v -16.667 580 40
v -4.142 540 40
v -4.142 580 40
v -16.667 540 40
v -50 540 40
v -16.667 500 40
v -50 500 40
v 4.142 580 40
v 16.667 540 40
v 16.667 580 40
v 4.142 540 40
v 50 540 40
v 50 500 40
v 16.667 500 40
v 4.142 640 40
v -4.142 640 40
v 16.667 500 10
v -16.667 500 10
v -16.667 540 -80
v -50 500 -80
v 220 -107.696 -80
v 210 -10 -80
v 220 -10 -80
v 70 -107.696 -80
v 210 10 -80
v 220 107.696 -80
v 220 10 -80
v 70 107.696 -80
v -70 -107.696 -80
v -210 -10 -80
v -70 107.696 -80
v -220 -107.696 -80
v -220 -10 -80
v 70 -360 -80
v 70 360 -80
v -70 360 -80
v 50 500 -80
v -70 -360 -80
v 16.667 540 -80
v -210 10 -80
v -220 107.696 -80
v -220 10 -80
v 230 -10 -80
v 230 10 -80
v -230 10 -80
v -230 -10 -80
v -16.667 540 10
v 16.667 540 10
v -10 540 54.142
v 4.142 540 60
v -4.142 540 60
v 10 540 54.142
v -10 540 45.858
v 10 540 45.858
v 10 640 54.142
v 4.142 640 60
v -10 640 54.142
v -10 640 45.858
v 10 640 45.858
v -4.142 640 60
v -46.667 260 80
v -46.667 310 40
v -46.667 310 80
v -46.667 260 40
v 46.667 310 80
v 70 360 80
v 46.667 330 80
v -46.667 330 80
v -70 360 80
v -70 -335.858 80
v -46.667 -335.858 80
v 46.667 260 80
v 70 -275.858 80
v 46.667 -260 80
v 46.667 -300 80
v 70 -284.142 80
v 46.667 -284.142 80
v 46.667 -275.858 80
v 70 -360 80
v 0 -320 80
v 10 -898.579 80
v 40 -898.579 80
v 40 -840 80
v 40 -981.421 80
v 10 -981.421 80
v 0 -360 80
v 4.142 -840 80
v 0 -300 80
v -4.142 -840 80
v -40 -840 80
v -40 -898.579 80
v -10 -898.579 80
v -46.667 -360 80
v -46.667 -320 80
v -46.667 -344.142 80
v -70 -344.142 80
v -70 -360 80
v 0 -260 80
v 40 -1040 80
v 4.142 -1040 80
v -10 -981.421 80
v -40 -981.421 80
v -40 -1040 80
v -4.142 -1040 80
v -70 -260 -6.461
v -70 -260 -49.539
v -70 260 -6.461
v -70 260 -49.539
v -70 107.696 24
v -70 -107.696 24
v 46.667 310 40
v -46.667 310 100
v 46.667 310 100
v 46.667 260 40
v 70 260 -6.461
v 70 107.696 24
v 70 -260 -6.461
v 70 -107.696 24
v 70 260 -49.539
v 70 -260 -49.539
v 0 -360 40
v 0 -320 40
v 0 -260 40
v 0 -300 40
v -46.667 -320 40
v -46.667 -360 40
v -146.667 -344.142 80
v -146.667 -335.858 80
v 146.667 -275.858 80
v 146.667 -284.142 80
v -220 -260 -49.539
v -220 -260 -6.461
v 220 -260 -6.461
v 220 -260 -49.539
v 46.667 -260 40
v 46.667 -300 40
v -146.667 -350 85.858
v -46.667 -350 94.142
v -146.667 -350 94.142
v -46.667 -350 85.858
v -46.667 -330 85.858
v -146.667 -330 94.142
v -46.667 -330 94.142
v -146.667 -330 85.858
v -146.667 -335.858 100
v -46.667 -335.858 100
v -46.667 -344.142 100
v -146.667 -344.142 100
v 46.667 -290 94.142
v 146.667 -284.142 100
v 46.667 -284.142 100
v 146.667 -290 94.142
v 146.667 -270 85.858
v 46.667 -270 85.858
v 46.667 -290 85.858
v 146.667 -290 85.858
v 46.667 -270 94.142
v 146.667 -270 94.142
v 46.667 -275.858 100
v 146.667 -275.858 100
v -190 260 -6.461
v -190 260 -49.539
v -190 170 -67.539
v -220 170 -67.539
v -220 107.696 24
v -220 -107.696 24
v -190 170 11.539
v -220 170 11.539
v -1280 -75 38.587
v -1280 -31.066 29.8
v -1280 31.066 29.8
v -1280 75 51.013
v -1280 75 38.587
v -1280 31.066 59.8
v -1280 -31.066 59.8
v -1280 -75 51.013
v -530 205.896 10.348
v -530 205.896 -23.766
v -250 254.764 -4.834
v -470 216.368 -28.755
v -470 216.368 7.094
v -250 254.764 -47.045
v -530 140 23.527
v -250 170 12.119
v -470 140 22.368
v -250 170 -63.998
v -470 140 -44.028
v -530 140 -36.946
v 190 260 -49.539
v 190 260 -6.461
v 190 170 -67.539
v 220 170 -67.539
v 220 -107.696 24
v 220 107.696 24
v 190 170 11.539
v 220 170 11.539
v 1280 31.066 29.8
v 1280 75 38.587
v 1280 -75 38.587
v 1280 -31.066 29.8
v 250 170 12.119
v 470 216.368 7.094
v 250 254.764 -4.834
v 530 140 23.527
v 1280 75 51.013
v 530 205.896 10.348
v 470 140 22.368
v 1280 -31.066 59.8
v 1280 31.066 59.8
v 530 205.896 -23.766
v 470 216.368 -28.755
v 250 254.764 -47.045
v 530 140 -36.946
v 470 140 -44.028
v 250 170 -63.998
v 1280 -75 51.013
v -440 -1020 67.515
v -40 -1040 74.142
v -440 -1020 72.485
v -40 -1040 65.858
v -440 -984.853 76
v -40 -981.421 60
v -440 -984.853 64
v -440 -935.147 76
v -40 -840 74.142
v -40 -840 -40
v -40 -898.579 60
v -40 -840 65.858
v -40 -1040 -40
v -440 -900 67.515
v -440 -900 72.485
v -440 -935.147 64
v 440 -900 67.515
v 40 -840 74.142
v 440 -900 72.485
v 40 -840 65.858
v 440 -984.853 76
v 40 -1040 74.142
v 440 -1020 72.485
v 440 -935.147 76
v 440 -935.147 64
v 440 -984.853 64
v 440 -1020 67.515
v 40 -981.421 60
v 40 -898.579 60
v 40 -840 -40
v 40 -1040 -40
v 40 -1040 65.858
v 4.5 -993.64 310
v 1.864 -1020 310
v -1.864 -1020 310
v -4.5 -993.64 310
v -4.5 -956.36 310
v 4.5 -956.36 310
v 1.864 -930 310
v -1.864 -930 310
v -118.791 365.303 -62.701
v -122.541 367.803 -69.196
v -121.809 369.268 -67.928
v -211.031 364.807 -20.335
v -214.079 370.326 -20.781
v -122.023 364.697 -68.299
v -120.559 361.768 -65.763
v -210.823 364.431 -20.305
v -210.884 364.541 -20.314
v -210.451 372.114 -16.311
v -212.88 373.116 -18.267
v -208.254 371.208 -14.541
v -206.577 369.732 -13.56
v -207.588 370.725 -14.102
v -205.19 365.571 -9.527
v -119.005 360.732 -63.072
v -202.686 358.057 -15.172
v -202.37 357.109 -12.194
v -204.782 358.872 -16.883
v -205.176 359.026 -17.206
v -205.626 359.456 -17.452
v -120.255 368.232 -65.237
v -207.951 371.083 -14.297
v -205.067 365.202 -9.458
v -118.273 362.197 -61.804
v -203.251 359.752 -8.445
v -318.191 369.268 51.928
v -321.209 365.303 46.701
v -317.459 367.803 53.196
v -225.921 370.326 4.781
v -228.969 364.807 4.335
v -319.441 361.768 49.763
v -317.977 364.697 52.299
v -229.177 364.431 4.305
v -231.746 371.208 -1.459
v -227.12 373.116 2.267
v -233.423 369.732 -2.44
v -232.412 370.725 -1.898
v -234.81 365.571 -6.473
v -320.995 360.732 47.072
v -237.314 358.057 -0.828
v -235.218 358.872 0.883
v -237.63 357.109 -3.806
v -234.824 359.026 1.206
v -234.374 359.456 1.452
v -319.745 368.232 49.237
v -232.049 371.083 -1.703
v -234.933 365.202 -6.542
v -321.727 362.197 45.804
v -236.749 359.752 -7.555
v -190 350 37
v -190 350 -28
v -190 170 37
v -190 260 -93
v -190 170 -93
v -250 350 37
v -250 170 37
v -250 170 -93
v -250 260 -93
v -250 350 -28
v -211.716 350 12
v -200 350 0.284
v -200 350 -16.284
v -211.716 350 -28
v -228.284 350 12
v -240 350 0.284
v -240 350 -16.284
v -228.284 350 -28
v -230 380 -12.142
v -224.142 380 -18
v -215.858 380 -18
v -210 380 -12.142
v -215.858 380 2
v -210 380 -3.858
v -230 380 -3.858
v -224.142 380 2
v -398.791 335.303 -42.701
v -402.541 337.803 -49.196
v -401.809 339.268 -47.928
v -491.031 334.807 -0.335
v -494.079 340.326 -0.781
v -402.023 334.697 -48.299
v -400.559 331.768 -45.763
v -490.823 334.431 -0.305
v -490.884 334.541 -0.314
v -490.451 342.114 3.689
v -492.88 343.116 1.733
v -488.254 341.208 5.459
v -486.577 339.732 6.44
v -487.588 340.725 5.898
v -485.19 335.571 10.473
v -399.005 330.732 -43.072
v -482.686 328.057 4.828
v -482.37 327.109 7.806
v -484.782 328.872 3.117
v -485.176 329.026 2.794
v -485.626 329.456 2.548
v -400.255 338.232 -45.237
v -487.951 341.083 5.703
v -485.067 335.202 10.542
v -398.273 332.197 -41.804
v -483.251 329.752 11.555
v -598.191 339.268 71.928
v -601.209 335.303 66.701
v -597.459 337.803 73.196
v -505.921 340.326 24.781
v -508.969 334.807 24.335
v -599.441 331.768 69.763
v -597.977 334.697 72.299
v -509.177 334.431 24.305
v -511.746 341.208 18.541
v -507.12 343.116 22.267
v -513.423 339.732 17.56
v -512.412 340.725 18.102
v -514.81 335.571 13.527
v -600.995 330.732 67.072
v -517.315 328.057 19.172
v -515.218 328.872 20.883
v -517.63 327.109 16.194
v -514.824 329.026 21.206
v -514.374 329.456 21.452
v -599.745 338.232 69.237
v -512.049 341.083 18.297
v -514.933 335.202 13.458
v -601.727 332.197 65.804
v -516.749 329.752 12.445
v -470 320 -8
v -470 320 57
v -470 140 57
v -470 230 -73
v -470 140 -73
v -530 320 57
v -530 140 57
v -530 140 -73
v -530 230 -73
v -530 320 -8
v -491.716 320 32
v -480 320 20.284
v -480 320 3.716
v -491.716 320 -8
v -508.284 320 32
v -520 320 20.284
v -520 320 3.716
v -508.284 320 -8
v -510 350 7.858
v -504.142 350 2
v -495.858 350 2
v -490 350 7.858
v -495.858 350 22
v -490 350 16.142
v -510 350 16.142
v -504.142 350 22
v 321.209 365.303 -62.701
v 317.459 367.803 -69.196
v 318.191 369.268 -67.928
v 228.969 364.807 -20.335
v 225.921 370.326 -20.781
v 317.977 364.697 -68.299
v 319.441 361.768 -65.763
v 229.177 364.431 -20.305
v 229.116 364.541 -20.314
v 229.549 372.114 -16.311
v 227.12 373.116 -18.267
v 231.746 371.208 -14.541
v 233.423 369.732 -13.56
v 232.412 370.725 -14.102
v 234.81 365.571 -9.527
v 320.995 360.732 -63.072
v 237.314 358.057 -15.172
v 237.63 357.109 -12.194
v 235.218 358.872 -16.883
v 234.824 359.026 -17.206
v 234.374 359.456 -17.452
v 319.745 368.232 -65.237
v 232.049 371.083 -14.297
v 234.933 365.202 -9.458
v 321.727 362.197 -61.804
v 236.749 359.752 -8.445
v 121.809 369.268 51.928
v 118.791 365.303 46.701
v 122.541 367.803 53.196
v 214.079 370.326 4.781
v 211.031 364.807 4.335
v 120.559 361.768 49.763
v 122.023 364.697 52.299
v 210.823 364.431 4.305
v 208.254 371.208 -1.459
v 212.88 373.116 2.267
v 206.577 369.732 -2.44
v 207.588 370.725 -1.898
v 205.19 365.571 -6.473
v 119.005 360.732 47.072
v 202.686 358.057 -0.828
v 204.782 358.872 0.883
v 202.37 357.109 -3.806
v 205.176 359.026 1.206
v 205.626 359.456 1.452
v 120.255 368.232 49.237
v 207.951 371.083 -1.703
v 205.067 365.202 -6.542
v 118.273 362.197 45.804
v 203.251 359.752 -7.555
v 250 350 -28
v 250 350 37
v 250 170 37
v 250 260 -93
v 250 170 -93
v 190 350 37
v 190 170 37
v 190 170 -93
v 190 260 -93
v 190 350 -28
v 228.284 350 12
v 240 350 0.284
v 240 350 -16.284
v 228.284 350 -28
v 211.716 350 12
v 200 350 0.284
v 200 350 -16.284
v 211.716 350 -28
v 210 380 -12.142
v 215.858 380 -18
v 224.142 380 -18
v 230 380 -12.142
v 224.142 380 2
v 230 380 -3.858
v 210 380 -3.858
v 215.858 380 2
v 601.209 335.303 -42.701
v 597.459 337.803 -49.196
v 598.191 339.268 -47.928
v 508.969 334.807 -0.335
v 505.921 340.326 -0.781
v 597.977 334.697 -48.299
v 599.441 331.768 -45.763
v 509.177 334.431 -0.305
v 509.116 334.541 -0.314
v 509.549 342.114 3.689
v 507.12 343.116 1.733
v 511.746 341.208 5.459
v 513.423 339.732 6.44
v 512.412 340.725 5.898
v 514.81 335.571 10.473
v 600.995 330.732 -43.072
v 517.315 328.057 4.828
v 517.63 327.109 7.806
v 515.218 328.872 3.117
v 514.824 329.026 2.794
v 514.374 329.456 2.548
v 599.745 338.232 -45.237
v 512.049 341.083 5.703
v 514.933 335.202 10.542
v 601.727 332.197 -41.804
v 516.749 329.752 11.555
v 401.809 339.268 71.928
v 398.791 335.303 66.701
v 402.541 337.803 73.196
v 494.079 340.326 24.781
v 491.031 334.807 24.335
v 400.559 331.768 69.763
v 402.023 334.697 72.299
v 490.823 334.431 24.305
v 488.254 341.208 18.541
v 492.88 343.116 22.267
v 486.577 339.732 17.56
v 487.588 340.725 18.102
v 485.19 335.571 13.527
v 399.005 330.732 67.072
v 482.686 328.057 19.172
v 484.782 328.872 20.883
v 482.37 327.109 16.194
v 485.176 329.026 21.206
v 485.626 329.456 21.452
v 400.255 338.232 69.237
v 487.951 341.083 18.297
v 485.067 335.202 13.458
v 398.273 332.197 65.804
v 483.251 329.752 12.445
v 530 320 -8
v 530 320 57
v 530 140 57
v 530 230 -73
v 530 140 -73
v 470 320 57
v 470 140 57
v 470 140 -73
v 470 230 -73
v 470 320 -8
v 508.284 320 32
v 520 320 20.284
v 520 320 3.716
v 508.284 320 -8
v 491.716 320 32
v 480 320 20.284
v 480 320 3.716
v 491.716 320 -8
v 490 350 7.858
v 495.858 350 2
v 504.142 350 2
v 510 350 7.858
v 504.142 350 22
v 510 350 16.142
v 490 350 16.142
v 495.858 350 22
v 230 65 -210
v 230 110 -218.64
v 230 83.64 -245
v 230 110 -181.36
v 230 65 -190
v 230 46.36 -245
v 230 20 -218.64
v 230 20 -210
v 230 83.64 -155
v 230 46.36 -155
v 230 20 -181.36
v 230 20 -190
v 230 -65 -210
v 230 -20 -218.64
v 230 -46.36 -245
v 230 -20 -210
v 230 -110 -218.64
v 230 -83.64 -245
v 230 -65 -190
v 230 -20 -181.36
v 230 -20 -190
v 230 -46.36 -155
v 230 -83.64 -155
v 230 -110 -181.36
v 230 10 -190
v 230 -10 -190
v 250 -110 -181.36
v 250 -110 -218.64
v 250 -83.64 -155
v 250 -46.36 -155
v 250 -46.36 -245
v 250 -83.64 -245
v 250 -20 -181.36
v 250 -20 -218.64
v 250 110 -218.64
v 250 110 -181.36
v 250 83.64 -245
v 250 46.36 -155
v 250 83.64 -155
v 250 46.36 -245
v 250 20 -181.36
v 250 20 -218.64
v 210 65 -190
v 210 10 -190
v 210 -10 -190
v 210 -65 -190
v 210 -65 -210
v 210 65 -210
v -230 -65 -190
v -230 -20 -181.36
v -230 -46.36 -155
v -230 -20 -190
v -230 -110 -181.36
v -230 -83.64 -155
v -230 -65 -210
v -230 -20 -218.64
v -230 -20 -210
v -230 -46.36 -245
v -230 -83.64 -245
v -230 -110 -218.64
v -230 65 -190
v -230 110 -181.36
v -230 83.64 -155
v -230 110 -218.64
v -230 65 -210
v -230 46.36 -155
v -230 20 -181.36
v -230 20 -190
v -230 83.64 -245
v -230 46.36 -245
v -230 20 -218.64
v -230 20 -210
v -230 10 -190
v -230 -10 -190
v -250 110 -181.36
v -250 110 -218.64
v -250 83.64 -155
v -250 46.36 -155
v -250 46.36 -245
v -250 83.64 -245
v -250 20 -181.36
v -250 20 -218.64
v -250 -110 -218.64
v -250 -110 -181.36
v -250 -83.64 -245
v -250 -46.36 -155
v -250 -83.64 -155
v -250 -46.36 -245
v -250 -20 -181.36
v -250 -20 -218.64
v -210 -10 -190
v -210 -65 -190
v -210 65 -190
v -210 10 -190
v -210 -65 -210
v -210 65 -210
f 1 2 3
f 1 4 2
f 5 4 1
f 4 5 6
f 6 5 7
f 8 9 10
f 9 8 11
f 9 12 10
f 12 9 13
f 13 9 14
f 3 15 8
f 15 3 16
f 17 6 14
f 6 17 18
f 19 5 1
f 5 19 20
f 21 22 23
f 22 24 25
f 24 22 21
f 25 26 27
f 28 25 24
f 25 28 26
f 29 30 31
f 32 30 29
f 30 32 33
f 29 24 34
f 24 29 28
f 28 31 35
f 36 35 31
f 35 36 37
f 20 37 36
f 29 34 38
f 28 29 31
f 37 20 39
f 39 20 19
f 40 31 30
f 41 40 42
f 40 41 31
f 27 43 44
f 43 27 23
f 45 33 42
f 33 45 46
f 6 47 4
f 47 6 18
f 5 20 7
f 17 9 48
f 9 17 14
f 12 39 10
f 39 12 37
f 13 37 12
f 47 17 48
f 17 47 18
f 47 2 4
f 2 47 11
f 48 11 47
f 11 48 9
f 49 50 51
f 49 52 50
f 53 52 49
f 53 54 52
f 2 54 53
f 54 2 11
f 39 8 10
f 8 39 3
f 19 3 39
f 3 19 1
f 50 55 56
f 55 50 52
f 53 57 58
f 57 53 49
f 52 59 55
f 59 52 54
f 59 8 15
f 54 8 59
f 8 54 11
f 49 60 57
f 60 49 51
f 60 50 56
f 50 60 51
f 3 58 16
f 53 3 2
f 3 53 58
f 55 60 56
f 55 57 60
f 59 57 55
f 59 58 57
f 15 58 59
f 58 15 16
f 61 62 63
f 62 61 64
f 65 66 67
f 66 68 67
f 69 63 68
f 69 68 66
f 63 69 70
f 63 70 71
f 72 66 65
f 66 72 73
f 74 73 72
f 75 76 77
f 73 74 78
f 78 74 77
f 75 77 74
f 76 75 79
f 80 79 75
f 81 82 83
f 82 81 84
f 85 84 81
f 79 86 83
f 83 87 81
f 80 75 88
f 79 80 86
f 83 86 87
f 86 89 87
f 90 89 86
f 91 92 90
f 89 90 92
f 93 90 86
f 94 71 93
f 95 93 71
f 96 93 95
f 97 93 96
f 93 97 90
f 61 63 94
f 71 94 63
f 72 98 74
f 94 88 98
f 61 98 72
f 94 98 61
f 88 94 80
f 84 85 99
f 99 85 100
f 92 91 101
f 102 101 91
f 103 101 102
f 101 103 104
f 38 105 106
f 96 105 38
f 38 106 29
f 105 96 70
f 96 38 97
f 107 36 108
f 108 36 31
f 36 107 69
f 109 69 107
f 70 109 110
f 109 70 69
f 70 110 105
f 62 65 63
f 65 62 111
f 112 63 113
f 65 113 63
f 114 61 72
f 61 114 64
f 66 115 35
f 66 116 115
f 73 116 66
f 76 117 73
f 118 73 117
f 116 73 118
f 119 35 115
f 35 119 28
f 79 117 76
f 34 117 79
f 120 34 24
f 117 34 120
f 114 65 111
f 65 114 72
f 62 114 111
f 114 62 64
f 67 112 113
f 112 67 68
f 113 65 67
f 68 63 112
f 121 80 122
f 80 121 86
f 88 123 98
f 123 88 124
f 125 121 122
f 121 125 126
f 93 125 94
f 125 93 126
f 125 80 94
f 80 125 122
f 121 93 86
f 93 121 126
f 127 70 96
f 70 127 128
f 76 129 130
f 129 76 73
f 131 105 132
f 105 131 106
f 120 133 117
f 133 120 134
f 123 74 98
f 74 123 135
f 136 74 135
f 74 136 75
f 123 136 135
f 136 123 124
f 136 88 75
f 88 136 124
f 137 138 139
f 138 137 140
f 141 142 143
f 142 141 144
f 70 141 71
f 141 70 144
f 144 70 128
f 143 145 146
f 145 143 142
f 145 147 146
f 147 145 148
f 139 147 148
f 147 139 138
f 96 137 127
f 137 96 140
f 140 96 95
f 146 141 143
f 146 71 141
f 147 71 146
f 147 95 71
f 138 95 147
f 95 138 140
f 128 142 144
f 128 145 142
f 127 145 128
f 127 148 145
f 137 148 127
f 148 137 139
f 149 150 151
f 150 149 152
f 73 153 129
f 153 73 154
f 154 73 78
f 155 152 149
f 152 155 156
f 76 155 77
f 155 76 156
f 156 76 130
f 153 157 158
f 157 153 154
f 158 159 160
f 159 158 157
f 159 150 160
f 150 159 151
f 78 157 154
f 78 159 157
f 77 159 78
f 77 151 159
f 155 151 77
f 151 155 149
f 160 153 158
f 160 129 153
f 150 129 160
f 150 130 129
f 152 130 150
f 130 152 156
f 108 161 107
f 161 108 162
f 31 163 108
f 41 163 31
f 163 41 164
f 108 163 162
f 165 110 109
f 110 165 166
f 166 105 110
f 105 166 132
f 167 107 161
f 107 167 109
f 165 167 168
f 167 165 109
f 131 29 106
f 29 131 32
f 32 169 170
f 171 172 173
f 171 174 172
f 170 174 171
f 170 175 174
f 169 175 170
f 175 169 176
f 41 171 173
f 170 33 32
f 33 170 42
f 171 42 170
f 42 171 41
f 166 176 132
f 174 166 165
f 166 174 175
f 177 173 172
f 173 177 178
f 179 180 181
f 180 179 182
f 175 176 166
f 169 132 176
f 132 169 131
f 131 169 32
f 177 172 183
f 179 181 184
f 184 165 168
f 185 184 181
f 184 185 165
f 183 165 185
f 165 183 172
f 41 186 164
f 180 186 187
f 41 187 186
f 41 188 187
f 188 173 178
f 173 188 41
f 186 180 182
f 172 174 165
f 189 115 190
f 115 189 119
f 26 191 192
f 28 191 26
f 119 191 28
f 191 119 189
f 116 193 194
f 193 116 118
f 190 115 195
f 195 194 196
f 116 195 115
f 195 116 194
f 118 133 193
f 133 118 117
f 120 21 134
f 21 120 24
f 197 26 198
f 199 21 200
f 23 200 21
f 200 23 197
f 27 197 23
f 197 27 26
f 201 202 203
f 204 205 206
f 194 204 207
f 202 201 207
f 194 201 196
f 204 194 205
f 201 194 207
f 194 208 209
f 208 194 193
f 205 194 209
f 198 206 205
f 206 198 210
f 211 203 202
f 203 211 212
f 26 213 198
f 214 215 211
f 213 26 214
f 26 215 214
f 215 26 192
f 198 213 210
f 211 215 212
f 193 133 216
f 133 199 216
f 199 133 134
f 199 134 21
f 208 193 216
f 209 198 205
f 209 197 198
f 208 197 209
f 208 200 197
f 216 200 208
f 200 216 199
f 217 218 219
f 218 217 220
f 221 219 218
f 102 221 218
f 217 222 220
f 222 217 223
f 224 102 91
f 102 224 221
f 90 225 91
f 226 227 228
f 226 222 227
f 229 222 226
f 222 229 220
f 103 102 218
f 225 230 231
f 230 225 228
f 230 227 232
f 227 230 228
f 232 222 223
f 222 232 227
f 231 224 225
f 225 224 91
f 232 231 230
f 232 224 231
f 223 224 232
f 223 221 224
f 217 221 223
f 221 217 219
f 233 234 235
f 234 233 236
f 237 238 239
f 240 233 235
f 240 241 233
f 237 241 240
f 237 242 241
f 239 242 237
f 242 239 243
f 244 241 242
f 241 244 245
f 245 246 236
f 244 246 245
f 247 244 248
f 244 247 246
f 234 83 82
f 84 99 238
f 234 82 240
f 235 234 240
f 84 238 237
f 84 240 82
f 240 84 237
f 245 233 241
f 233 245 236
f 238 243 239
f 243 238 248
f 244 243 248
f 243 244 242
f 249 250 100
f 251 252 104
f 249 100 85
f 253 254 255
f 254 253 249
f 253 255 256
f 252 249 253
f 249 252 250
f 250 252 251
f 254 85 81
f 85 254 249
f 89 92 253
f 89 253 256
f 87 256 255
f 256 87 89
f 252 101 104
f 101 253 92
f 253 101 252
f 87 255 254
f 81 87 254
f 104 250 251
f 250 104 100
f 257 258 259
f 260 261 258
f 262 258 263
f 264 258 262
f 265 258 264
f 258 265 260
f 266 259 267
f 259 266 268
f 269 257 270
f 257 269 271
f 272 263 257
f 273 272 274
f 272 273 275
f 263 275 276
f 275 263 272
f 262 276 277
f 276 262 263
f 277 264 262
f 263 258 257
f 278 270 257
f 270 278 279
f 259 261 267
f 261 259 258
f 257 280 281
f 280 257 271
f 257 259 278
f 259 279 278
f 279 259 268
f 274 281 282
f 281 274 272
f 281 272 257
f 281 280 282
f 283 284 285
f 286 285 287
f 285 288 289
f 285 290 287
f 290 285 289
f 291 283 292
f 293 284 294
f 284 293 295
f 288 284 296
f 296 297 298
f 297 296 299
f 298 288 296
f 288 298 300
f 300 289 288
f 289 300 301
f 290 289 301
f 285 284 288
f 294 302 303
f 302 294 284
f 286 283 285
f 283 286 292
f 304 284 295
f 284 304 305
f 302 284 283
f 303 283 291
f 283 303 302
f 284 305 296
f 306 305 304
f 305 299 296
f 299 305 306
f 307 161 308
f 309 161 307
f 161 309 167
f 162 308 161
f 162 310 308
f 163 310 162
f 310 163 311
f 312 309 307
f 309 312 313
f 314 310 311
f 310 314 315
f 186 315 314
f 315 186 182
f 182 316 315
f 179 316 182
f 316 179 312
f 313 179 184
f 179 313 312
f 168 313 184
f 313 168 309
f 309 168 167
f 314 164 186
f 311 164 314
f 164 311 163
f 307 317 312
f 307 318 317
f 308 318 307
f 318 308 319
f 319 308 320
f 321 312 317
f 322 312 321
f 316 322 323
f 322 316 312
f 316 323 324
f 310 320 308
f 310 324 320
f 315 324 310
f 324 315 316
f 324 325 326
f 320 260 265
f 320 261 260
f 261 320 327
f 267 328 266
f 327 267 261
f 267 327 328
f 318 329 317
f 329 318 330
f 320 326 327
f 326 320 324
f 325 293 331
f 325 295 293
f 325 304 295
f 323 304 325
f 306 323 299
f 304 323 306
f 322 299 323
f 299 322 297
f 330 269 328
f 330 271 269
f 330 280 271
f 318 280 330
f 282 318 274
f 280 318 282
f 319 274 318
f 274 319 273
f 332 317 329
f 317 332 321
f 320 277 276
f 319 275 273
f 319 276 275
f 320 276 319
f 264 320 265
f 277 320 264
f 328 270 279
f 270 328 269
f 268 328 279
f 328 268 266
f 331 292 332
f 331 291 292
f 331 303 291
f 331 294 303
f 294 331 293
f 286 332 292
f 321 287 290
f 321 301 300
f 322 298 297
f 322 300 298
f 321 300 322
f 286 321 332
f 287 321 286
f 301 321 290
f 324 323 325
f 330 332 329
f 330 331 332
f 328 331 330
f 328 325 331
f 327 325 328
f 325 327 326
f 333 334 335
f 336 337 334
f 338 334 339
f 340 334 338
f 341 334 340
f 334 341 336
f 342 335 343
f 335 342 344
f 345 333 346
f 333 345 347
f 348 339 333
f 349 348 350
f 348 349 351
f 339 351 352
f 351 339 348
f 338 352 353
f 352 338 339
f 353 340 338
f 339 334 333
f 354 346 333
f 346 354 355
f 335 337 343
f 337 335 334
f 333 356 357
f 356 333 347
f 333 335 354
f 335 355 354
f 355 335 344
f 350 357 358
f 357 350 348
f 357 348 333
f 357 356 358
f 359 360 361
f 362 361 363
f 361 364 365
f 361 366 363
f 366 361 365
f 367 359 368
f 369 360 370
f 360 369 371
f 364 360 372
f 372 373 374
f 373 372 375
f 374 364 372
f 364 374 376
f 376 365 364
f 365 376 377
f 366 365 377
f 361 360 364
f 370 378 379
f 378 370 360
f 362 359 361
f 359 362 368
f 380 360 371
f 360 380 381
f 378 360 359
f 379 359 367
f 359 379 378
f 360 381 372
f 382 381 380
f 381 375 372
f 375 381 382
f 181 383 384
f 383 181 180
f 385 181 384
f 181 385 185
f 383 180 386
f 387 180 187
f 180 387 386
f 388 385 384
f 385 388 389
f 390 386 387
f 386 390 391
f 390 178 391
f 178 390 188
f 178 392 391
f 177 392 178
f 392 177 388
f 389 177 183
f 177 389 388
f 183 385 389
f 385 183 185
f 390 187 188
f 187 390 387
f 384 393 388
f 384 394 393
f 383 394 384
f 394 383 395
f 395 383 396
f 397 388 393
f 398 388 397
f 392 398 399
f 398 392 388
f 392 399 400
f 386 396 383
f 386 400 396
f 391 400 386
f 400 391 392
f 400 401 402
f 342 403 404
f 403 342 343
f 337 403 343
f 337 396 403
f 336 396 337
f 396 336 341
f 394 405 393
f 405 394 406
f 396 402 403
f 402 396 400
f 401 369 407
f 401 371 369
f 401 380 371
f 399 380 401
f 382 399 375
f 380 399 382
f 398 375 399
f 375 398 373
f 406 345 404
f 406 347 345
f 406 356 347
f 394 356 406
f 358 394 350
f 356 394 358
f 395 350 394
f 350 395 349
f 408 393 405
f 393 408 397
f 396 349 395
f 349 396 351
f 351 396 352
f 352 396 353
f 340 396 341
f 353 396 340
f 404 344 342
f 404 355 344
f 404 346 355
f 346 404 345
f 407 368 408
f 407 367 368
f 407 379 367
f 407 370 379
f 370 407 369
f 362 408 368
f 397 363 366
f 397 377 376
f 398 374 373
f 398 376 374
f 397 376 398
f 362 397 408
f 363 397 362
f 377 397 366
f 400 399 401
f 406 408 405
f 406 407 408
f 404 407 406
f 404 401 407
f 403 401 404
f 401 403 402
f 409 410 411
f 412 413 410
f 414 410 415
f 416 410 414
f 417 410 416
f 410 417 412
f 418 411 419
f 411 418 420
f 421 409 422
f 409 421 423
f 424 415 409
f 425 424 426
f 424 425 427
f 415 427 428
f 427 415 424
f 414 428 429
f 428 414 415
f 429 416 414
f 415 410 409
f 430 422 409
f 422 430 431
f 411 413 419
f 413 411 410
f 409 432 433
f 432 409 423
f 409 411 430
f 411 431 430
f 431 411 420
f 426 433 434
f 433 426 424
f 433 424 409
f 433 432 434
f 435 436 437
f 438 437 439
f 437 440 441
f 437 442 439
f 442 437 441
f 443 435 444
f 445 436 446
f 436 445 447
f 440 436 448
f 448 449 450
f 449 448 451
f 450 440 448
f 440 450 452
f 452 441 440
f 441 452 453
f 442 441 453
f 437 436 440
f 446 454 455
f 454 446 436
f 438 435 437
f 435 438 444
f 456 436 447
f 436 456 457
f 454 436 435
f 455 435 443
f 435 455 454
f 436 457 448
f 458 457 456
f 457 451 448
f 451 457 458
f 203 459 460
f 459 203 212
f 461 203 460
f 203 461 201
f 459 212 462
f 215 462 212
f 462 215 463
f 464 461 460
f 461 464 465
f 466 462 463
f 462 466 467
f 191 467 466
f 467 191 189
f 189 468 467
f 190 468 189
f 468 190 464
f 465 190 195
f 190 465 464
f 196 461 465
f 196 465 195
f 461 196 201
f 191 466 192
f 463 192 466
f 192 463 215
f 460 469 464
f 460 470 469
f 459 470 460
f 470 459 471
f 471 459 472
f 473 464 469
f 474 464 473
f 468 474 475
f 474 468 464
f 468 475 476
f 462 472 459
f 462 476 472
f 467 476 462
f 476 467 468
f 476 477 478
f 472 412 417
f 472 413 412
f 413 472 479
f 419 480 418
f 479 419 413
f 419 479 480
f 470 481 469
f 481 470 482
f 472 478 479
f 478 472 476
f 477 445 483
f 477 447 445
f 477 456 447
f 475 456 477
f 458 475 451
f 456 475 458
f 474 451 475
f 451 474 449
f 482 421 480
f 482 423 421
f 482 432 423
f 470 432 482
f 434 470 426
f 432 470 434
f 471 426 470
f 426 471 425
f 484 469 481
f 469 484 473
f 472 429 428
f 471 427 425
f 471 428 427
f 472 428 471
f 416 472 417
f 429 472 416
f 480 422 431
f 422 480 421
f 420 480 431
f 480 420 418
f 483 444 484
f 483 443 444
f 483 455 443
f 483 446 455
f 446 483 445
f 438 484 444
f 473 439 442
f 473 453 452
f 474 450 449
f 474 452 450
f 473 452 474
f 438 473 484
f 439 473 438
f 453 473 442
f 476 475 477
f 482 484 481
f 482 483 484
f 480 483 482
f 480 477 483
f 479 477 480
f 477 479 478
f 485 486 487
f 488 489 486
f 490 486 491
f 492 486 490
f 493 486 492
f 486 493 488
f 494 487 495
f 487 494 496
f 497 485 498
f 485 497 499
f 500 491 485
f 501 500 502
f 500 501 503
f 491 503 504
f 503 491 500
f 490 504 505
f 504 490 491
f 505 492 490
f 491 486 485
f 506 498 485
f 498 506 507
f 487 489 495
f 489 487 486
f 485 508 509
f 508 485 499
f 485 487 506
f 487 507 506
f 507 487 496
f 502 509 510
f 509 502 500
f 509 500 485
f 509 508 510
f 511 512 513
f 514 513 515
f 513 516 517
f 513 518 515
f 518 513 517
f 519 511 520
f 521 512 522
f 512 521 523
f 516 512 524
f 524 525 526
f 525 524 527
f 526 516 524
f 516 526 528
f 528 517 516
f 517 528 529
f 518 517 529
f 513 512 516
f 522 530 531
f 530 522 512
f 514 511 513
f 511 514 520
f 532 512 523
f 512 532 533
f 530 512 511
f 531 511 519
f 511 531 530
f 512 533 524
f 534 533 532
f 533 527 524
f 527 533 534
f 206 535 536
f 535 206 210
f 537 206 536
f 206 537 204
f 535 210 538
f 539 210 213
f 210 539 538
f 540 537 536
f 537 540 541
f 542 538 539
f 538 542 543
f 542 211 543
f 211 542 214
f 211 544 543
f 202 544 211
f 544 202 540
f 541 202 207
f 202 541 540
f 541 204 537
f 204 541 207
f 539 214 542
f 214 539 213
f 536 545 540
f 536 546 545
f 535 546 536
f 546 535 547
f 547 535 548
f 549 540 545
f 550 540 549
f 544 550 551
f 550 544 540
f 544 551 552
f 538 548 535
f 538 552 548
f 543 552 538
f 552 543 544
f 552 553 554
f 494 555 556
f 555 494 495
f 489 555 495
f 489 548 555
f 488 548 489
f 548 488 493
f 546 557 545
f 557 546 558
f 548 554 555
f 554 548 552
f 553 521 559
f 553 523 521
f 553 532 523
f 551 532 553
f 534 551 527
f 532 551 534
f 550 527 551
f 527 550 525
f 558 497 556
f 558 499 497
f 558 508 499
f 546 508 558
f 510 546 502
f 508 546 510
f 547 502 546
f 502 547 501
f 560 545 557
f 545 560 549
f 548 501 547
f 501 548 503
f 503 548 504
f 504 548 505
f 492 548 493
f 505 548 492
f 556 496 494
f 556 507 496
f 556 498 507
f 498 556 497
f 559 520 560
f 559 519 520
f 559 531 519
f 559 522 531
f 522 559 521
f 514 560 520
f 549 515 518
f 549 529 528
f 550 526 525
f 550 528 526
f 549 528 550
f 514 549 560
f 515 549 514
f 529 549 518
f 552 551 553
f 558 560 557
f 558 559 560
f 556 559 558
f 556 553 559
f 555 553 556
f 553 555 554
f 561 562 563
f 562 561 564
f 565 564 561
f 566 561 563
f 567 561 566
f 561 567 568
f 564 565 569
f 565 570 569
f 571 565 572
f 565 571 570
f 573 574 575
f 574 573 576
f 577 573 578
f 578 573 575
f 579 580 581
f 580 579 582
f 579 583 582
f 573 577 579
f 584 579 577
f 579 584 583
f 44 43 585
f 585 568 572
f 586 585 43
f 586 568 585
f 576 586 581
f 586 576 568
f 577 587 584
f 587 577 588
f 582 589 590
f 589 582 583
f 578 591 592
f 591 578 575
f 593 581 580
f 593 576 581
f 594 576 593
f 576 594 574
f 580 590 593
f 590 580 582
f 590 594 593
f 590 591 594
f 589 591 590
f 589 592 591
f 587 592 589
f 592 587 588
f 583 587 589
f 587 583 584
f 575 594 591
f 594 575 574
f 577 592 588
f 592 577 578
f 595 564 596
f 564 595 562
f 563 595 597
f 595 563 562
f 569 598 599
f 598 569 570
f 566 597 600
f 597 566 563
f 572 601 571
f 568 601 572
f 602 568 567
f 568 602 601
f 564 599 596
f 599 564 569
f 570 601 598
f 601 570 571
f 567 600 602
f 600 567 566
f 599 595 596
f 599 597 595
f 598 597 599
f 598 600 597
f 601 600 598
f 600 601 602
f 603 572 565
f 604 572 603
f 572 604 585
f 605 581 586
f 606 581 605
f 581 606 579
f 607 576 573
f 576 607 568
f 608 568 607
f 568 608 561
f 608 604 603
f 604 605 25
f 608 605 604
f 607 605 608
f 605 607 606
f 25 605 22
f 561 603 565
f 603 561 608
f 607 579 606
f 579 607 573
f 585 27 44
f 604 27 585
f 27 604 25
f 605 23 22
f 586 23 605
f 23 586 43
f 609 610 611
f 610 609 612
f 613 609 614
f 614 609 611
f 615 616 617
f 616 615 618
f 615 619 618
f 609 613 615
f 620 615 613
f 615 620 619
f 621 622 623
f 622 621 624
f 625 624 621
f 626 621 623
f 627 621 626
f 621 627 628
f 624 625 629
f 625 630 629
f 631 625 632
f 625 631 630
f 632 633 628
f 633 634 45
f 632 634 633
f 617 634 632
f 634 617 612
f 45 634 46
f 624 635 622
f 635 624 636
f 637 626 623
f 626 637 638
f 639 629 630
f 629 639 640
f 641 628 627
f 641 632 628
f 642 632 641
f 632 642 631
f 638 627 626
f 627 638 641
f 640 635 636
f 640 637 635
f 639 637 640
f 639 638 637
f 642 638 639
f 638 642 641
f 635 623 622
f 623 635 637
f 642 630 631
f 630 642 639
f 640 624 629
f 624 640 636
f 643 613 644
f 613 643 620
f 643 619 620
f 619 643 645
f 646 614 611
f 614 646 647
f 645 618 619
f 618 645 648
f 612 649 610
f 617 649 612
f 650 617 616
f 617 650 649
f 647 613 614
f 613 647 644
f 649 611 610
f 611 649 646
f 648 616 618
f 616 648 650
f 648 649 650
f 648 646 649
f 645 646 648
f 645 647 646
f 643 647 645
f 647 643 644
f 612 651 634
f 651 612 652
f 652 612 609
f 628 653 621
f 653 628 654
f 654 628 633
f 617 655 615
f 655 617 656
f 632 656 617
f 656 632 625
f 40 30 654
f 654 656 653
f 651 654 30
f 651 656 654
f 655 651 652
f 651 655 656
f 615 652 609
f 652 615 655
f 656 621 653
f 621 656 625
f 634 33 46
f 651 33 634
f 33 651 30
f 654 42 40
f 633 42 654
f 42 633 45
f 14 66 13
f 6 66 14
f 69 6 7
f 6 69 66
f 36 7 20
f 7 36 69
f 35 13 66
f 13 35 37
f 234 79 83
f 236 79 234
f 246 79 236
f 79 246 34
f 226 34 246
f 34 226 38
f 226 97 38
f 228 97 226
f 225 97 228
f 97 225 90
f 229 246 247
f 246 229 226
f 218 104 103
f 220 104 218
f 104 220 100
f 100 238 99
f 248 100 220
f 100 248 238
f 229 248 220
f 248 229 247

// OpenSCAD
/*
Tupolev TB-3 from behind;
1 unit = 16 mm (actual wingspan = 41.8 metres);
Y=0 at middle of wings; Z=0 at centerline of thickest fuselage
*/

/*
Sections of fuselage from front to rear:
    1: "front":     front of frustum
    2: "front-mid": frustum
    3: "mid-front": from frustum to leading  edge of wings
    4: "mid":       from leading to trailing edge of wings
    5: "mid-rear":  from trailing edge of wings to frustum
    6: "rear-mid":  frustum
    7: "rear":      rectangular cuboid
*/
FUL1 =  80;  // length - front
FUL2 = 140;  // length - front-mid
FUW2 = 100;  // width  - front-mid
FUH2 = 120;  // height - front-mid
FUL3 = 100;  // length - mid-front
FUL4 = 520;
FUW4 = 140;  // width  - mid
FUH4 = 160;  // height - mid
FUL5 = 100;  // length - mid-rear
FUL6 = 480;  // length - rear-mid
FUL7 = 200;  // length - rear
FUW7 =  80;  // width  - rear
FUH7 = 120;  // height - rear

/*
For wings and stabilisers:
    "length" = from fuselage to tip
    "width"  = from leading to trailing edge
Sections of wing: inner, outer. Separated by centerline of inner engine.
*/
WIA  =    5;  // width/thickness (must be uniform)
WIL1 =  150;  // length - inner
WIW1 = FUL4;  // width - inner
WIL2 = 1060;  // length - outer
WIW2 =  150;  // width - outer
WTSL = 7/10;  // tip vertical slant (of max height)

// stabilisers
HSTL  = 400;  // horizontal - length
VSTL  = 230;  // vertical   - length
HSTW2 = 120;  // horizontal - width outer
VSTW2 =  90;  // vertical   - width outer

// engines
ENW  =  60;  // width
ENL  = 180;  // length
ENH  = 130;  // height
ENOX = 280;  // outer engine X/Y/Z relative to inner
ENOY = -30;
ENOZ =  20;
PHR  =  20;  // propeller hub radius/length
PHL  =  30;
PBL  = 115;  // propeller blade length/width/thickness
PBW  =  20;
PBT  =  10;

// landing gear
GEH = 110;  // height (vertical beam)
GEL = 130;  // length (horizontal beam)
WHR =  45;  // wheel radius

GUL = 100;  // gun length

THIN = 20;  // minimum thickness of anything

// colors
FUC = [.8, .5, .5];  // fuselage
PLC = [.8, .8, .5];  // wings and stabilisers
OTC = [.5, .8, .8];  // other parts

// fuselage
// front
translate([0, FUL2+FUL3+(FUL1+FUL4)/2, (FUH2-FUH4)/2]) {
    color(FUC) front_fuselage();
    // gun
    color(OTC) translate([0, GUL/2, (FUH2+THIN)/2]) {
        scale([THIN, GUL, THIN]) octaprism();
    }
}
// front-mid
color(FUC) translate([0, FUL3+(FUL2+FUL4)/2, 0]) scale([FUW4, FUL2, FUH4]) {
    sqfrustum(FUW2/FUW4, FUH2/FUH4, 0, (FUH2/FUH4-1)/2);
}
// mid-front
translate([0, (FUL4+FUL3)/2, 0]) {
    color(FUC) mid_front_fuselage();
    // windshield
    color(OTC) translate([0, THIN/2, (FUH4+THIN)/2]) {
        scale([FUW4*2/3, THIN, THIN]) halfcube();
    }
}
// mid
color(FUC) cube([FUW4, FUL4, FUH4], center=true);
// mid-rear
translate([0, -(FUL4+FUL5)/2, 0]) {
    color(FUC) mid_rear_fuselage();
    // guns
    color(OTC) for(x = [-1, 1]) {
        translate([x*(FUW4/3+GUL/2), x*FUL5*3/10, (FUH4+THIN)/2]) {
            rotate(90) scale([THIN, GUL, THIN]) octaprism();
        }
    }
}
// rear-mid
translate([0, -FUL5-(FUL4+FUL6)/2, 0]) color(FUC) {
    rotate(180) scale([FUW4, FUL6, FUH4]) {
        sqfrustum(FUW7/FUW4, FUH7/FUH4, 0, (1-FUH7/FUH4)/2);
    }
}
// rear
translate([0, -FUL5-FUL6-(FUL4+FUL7)/2, (FUH4-FUH7)/2]) {
    color(FUC) cube([FUW7, FUL7, FUH7], center=true);
}

// wings
color(PLC) translate([0, 0, (WIW1/WIA-FUH4)/2]) for(x = [-1, 1]) {
    // inner
    translate([x*(FUW4+WIL1)/2, 0, 0]) {
        scale([WIL1, WIW1, WIW1/WIA]) rotate(90) octaprism();
    }
    // outer
    translate([x*((FUW4+WIL2)/2+WIL1), 0, 0]) {
        rotate(-x*90) scale([WIW1, WIL2, WIW1/WIA]) {
            octafrustum(WIW2/WIW1, 0, WTSL);
        }
    }
}
// stabilisers
color(PLC) translate([0, -FUL5-FUL6-(FUL4+FUL7)/2, (FUH4-FUH7)/2]) {
    // horizontal
    for(x = [-1, 1])  {
        translate([x*(FUW7+HSTL)/2, 0, (FUH7-THIN)/2]) {
            rotate([0, -90+x*90, -x*90]) scale([FUL7, HSTL, THIN]) {
                octafrustum(HSTW2/FUL7, 1/2-(HSTW2/2+20)/FUL7, 0);
            }
        }
    }
    // vertical
    translate([0, 0, (FUH7+VSTL)/2]) rotate([90, 0, -90]) {
        scale([FUL7, VSTL, THIN]) {
            octafrustum(VSTW2/FUL7, 1/2-(VSTW2/2+20)/FUL7, 0);
        }
    }
}

// engines (x = left/right, o = inner/outer)
color(OTC) for(x = [-1, 1], o = [0, 1]) {
    translate(
        [x*(FUW4/2+WIL1+o*ENOX), WIW1/2+o*ENOY, (WIW1/WIA-FUH4)/2+o*ENOZ]
    ) engine();
}
// landing gear
color(OTC) for(zr = [0, 180]) rotate(zr) translate([FUW4/2+WIL1, 0, -FUH4/2]) landing_gear();

module front_fuselage() {
    // 6 polyhedra
    scale([FUW2/3, FUL1/2, FUH2]) {
        // center
        translate([0, -1/2, -1/8]) cube([1, 1, 3/4], center=true);  // rear
        translate([0,  1/2,    0]) rotate([0, 180, 0]) halfcube();  // front
        // left/right
        for(x = [-1, 1]) translate([x, 0, 0]) {
            // rear
            translate([0, -1/2, 0]) rotate([0, 135-x*45, 0]) fivesixthscube();
            // front
            translate([0,  1/2, 0]) rotate([0, 135-x*45, 0]) sixthcube();
        }
    }
}

module mid_front_fuselage() {
    // rear half is seat; seat width is 2/3 of total width
    scale([FUW4, FUL3, FUH4]) {
        // front
        translate([0,  1/4,    0]) cube([  1, 1/2,   1], center=true);
        // rear center
        translate([0, -1/4, -1/8]) cube([2/3, 1/2, 3/4], center=true);
        // rear left/right
        for(x = [-1, 1]) {
            translate([x*5/12, -1/4, 0]) cube([1/6, 1/2, 1], center=true);
        }
    }
}

module mid_rear_fuselage() {
    // gunners' seats; 6 cuboids; all have the same Z_min;
    // from above ("S" = seat, "." = full-height):
    //   . . . S S .
    //   . . . S S .
    //   . . . . . .
    //   . S S . . .
    //   . S S . . .
    for(x = [-1, 1]) {
        scale([FUW4, FUL5, FUH4]) {
            // seats (front right / rear left)
            translate([x/6, x*3/10, -1/8]) cube([1/3, 2/5, 3/4], center=true);
            // large full-height cuboids (front left / rear right)
            translate([x/4, -x/5, 0]) cube([1/2, 3/5, 1], center=true);
            // small full-height cuboids (front right / rear left)
            translate([x*5/12, x*3/10, 0]) cube([1/6, 2/5, 1], center=true);
        }
    }
}

module engine() {
    // rear
    translate([0, -ENL/4, 0]) cube([ENW, ENL/2, ENH], center=true);
    // front
    translate([0, ENL/4, 0]) {
        scale([ENW, ENL/2, ENH]) sqfrustum(1, 1/2, 0, 1/4);
    }
    // propeller hub
    translate([0, ENL/2+PHL/2, PHR]) {
        scale([PHR*2, PHL, PHR*2]) octafrustum(1/2, 0, 0);
    }
    // propeller blades
    translate([0, (ENL+PHL)/2, PHR]) for(x = [0, 1]) {
        rotate([0, 30+x*180, 0])
            translate([PBL/2, 0, 0])
            rotate([0,45,-90]) scale([PBT, PBL, PBW]) octafrustum(1/2, 0, 0);
    }
}

module landing_gear() {
    // centered on vertical beam
    // vertical beam
    translate([0, 0, -GEH/2]) cube([THIN, THIN, GEH], center=true);
    translate([0, 0, -GEH-THIN/2]) {
        // horizontal beam
        cube([THIN, GEL, THIN], center=true);
        // wheels
        translate([THIN, 0, 0]) for(x = [-1, 1]) translate([0, x*GEL/2, 0]) {
            rotate(x*90) scale([WHR*2, THIN, WHR*2]) octaprism();
        }
    }
}

module sixthcube() {
    // a unit cube but 5/6 sliced away from top front right along 3 vertices
    translate([-1/2, -1/2, -1/2]) polyhedron(
        [
            [0, 0, 0],
            [1, 0, 0],
            [0, 1, 0],
            [0, 0, 1],
        ],
        [
            [0, 1, 2],
            [0, 2, 3],
            [0, 3, 1],
            [1, 3, 2],
        ]
    );
}

module halfcube() {
    // a unit cube but 1/2 sliced away from top front along 4 vertices
    translate([-1/2, -1/2, -1/2]) polyhedron(
        [
            [0, 0, 0],
            [1, 0, 0],
            [0, 1, 0],
            [1, 1, 0],
            [0, 0, 1],
            [1, 0, 1],
        ],
        [
            [0, 1, 3, 2],
            [0, 2, 4],
            [0, 4, 5, 1],
            [1, 5, 3],
            [2, 3, 5, 4],
        ]
    );
}

module fivesixthscube() {
    // a unit cube but 1/6 sliced away from top front right along 3 vertices
    translate([-1/2, -1/2, -1/2]) polyhedron(
        [
            [0, 0, 0],
            [1, 0, 0],
            [0, 1, 0],
            [1, 1, 0],
            [0, 0, 1],
            [1, 0, 1],
            [0, 1, 1],
        ],
        [
            [0, 1, 3, 2],
            [0, 2, 6, 4],
            [0, 4, 5, 1],
            [1, 5, 3],
            [2, 3, 6],
            [3, 5, 6],
            [4, 6, 5],
        ]
    );
}

module sqfrustum(fw, fh, fx, fz) {
    /*
    a rectangular pyramid cut by a plane parallel to the base;
    base towards viewer; four of the faces are vertical;
    rear width = rear height = length = 1;
    fw/fh = front width/height;
    fx/fz = front X/Z offset from centerline;
    note: X & Z centering is based on rear face only
    */
    polyhedron(
        [
            // rear
            [   -1/2, -1/2,    -1/2],
            [   -1/2, -1/2,     1/2],
            [    1/2, -1/2,     1/2],
            [    1/2, -1/2,    -1/2],
            // front
            [fx-fw/2,  1/2, fz-fh/2],
            [fx-fw/2,  1/2, fz+fh/2],
            [fx+fw/2,  1/2, fz+fh/2],
            [fx+fw/2,  1/2, fz-fh/2],
        ],
        [
            [0, 1, 2, 3],
            [0, 4, 5, 1],
            [1, 5, 6, 2],
            [2, 6, 7, 3],
            [3, 7, 4, 0],
            [4, 7, 6, 5],
        ]
    );
}

module octaprism() {
    /*
    a right octagonal prism;
    distance between any two parallel faces = 1;
    centered at [0, 0, 0]; base towards viewer
    */
    a = 1/(2+2*sqrt(2));  // small
    b = 1/2;              // big
    polyhedron(
        [
            // rear
            [-b, -b, -a],
            [-b, -b,  a],
            [-a, -b,  b],
            [ a, -b,  b],
            [ b, -b,  a],
            [ b, -b, -a],
            [ a, -b, -b],
            [-a, -b, -b],
            // front
            [-b,  b, -a],
            [-b,  b,  a],
            [-a,  b,  b],
            [ a,  b,  b],
            [ b,  b,  a],
            [ b,  b, -a],
            [ a,  b, -b],
            [-a,  b, -b],
        ],
        [
            [ 0,  1,  2,  3,  4,  5, 6, 7],
            [15, 14, 13, 12, 11, 10, 9, 8],
            [ 0,  8,  9,  1],
            [ 1,  9, 10,  2],
            [ 2, 10, 11,  3],
            [ 3, 11, 12,  4],
            [ 4, 12, 13,  5],
            [ 5, 13, 14,  6],
            [ 6, 14, 15,  7],
            [ 7, 15,  8,  0],
        ]
    );
}

module octafrustum(fs, fx, fy) {
    /*
    a frustum of an octagonal pyramid;
    centered at [0, 0, 0] (if fxo = fyo = 0);
    base towards viewer;
    front and rear faces: two vertical regular octagons
    with width = height = Y distance = 1;
    other faces: eight trapezoids;
    same as the octagonal prism if fs=1 and fxo = fyo = 0;
    args:
        fs = front width & height scale factor
        fx = front X offset from centerline
        fy = front Y offset from centerline
    note: front face must have same width/height ratio as rear face;
    otherwise side faces would not be planes
    */
    ra =  1/(2+2*sqrt(2));  // rear  small
    fa = fs/(2+2*sqrt(2));  // front small
    y  =  1/2;
    rb =  1/2;              // rear  big
    fb = fs/2;              // front big
    polyhedron(
        [
            // rear
            [  -rb, -y,   -ra],
            [  -rb, -y,    ra],
            [  -ra, -y,    rb],
            [   ra, -y,    rb],
            [   rb, -y,    ra],
            [   rb, -y,   -ra],
            [   ra, -y,   -rb],
            [  -ra, -y,   -rb],
            // front
            [fx-fb,  y, fy-fa],
            [fx-fb,  y, fy+fa],
            [fx-fa,  y, fy+fb],
            [fx+fa,  y, fy+fb],
            [fx+fb,  y, fy+fa],
            [fx+fb,  y, fy-fa],
            [fx+fa,  y, fy-fb],
            [fx-fa,  y, fy-fb],
        ],
        [
            [ 0,  1,  2,  3,  4,  5, 6, 7],
            [15, 14, 13, 12, 11, 10, 9, 8],
            [ 0,  8,  9,  1],
            [ 1,  9, 10,  2],
            [ 2, 10, 11,  3],
            [ 3, 11, 12,  4],
            [ 4, 12, 13,  5],
            [ 5, 13, 14,  6],
            [ 6, 14, 15,  7],
            [ 7, 15,  8,  0],
        ]
    );
}
